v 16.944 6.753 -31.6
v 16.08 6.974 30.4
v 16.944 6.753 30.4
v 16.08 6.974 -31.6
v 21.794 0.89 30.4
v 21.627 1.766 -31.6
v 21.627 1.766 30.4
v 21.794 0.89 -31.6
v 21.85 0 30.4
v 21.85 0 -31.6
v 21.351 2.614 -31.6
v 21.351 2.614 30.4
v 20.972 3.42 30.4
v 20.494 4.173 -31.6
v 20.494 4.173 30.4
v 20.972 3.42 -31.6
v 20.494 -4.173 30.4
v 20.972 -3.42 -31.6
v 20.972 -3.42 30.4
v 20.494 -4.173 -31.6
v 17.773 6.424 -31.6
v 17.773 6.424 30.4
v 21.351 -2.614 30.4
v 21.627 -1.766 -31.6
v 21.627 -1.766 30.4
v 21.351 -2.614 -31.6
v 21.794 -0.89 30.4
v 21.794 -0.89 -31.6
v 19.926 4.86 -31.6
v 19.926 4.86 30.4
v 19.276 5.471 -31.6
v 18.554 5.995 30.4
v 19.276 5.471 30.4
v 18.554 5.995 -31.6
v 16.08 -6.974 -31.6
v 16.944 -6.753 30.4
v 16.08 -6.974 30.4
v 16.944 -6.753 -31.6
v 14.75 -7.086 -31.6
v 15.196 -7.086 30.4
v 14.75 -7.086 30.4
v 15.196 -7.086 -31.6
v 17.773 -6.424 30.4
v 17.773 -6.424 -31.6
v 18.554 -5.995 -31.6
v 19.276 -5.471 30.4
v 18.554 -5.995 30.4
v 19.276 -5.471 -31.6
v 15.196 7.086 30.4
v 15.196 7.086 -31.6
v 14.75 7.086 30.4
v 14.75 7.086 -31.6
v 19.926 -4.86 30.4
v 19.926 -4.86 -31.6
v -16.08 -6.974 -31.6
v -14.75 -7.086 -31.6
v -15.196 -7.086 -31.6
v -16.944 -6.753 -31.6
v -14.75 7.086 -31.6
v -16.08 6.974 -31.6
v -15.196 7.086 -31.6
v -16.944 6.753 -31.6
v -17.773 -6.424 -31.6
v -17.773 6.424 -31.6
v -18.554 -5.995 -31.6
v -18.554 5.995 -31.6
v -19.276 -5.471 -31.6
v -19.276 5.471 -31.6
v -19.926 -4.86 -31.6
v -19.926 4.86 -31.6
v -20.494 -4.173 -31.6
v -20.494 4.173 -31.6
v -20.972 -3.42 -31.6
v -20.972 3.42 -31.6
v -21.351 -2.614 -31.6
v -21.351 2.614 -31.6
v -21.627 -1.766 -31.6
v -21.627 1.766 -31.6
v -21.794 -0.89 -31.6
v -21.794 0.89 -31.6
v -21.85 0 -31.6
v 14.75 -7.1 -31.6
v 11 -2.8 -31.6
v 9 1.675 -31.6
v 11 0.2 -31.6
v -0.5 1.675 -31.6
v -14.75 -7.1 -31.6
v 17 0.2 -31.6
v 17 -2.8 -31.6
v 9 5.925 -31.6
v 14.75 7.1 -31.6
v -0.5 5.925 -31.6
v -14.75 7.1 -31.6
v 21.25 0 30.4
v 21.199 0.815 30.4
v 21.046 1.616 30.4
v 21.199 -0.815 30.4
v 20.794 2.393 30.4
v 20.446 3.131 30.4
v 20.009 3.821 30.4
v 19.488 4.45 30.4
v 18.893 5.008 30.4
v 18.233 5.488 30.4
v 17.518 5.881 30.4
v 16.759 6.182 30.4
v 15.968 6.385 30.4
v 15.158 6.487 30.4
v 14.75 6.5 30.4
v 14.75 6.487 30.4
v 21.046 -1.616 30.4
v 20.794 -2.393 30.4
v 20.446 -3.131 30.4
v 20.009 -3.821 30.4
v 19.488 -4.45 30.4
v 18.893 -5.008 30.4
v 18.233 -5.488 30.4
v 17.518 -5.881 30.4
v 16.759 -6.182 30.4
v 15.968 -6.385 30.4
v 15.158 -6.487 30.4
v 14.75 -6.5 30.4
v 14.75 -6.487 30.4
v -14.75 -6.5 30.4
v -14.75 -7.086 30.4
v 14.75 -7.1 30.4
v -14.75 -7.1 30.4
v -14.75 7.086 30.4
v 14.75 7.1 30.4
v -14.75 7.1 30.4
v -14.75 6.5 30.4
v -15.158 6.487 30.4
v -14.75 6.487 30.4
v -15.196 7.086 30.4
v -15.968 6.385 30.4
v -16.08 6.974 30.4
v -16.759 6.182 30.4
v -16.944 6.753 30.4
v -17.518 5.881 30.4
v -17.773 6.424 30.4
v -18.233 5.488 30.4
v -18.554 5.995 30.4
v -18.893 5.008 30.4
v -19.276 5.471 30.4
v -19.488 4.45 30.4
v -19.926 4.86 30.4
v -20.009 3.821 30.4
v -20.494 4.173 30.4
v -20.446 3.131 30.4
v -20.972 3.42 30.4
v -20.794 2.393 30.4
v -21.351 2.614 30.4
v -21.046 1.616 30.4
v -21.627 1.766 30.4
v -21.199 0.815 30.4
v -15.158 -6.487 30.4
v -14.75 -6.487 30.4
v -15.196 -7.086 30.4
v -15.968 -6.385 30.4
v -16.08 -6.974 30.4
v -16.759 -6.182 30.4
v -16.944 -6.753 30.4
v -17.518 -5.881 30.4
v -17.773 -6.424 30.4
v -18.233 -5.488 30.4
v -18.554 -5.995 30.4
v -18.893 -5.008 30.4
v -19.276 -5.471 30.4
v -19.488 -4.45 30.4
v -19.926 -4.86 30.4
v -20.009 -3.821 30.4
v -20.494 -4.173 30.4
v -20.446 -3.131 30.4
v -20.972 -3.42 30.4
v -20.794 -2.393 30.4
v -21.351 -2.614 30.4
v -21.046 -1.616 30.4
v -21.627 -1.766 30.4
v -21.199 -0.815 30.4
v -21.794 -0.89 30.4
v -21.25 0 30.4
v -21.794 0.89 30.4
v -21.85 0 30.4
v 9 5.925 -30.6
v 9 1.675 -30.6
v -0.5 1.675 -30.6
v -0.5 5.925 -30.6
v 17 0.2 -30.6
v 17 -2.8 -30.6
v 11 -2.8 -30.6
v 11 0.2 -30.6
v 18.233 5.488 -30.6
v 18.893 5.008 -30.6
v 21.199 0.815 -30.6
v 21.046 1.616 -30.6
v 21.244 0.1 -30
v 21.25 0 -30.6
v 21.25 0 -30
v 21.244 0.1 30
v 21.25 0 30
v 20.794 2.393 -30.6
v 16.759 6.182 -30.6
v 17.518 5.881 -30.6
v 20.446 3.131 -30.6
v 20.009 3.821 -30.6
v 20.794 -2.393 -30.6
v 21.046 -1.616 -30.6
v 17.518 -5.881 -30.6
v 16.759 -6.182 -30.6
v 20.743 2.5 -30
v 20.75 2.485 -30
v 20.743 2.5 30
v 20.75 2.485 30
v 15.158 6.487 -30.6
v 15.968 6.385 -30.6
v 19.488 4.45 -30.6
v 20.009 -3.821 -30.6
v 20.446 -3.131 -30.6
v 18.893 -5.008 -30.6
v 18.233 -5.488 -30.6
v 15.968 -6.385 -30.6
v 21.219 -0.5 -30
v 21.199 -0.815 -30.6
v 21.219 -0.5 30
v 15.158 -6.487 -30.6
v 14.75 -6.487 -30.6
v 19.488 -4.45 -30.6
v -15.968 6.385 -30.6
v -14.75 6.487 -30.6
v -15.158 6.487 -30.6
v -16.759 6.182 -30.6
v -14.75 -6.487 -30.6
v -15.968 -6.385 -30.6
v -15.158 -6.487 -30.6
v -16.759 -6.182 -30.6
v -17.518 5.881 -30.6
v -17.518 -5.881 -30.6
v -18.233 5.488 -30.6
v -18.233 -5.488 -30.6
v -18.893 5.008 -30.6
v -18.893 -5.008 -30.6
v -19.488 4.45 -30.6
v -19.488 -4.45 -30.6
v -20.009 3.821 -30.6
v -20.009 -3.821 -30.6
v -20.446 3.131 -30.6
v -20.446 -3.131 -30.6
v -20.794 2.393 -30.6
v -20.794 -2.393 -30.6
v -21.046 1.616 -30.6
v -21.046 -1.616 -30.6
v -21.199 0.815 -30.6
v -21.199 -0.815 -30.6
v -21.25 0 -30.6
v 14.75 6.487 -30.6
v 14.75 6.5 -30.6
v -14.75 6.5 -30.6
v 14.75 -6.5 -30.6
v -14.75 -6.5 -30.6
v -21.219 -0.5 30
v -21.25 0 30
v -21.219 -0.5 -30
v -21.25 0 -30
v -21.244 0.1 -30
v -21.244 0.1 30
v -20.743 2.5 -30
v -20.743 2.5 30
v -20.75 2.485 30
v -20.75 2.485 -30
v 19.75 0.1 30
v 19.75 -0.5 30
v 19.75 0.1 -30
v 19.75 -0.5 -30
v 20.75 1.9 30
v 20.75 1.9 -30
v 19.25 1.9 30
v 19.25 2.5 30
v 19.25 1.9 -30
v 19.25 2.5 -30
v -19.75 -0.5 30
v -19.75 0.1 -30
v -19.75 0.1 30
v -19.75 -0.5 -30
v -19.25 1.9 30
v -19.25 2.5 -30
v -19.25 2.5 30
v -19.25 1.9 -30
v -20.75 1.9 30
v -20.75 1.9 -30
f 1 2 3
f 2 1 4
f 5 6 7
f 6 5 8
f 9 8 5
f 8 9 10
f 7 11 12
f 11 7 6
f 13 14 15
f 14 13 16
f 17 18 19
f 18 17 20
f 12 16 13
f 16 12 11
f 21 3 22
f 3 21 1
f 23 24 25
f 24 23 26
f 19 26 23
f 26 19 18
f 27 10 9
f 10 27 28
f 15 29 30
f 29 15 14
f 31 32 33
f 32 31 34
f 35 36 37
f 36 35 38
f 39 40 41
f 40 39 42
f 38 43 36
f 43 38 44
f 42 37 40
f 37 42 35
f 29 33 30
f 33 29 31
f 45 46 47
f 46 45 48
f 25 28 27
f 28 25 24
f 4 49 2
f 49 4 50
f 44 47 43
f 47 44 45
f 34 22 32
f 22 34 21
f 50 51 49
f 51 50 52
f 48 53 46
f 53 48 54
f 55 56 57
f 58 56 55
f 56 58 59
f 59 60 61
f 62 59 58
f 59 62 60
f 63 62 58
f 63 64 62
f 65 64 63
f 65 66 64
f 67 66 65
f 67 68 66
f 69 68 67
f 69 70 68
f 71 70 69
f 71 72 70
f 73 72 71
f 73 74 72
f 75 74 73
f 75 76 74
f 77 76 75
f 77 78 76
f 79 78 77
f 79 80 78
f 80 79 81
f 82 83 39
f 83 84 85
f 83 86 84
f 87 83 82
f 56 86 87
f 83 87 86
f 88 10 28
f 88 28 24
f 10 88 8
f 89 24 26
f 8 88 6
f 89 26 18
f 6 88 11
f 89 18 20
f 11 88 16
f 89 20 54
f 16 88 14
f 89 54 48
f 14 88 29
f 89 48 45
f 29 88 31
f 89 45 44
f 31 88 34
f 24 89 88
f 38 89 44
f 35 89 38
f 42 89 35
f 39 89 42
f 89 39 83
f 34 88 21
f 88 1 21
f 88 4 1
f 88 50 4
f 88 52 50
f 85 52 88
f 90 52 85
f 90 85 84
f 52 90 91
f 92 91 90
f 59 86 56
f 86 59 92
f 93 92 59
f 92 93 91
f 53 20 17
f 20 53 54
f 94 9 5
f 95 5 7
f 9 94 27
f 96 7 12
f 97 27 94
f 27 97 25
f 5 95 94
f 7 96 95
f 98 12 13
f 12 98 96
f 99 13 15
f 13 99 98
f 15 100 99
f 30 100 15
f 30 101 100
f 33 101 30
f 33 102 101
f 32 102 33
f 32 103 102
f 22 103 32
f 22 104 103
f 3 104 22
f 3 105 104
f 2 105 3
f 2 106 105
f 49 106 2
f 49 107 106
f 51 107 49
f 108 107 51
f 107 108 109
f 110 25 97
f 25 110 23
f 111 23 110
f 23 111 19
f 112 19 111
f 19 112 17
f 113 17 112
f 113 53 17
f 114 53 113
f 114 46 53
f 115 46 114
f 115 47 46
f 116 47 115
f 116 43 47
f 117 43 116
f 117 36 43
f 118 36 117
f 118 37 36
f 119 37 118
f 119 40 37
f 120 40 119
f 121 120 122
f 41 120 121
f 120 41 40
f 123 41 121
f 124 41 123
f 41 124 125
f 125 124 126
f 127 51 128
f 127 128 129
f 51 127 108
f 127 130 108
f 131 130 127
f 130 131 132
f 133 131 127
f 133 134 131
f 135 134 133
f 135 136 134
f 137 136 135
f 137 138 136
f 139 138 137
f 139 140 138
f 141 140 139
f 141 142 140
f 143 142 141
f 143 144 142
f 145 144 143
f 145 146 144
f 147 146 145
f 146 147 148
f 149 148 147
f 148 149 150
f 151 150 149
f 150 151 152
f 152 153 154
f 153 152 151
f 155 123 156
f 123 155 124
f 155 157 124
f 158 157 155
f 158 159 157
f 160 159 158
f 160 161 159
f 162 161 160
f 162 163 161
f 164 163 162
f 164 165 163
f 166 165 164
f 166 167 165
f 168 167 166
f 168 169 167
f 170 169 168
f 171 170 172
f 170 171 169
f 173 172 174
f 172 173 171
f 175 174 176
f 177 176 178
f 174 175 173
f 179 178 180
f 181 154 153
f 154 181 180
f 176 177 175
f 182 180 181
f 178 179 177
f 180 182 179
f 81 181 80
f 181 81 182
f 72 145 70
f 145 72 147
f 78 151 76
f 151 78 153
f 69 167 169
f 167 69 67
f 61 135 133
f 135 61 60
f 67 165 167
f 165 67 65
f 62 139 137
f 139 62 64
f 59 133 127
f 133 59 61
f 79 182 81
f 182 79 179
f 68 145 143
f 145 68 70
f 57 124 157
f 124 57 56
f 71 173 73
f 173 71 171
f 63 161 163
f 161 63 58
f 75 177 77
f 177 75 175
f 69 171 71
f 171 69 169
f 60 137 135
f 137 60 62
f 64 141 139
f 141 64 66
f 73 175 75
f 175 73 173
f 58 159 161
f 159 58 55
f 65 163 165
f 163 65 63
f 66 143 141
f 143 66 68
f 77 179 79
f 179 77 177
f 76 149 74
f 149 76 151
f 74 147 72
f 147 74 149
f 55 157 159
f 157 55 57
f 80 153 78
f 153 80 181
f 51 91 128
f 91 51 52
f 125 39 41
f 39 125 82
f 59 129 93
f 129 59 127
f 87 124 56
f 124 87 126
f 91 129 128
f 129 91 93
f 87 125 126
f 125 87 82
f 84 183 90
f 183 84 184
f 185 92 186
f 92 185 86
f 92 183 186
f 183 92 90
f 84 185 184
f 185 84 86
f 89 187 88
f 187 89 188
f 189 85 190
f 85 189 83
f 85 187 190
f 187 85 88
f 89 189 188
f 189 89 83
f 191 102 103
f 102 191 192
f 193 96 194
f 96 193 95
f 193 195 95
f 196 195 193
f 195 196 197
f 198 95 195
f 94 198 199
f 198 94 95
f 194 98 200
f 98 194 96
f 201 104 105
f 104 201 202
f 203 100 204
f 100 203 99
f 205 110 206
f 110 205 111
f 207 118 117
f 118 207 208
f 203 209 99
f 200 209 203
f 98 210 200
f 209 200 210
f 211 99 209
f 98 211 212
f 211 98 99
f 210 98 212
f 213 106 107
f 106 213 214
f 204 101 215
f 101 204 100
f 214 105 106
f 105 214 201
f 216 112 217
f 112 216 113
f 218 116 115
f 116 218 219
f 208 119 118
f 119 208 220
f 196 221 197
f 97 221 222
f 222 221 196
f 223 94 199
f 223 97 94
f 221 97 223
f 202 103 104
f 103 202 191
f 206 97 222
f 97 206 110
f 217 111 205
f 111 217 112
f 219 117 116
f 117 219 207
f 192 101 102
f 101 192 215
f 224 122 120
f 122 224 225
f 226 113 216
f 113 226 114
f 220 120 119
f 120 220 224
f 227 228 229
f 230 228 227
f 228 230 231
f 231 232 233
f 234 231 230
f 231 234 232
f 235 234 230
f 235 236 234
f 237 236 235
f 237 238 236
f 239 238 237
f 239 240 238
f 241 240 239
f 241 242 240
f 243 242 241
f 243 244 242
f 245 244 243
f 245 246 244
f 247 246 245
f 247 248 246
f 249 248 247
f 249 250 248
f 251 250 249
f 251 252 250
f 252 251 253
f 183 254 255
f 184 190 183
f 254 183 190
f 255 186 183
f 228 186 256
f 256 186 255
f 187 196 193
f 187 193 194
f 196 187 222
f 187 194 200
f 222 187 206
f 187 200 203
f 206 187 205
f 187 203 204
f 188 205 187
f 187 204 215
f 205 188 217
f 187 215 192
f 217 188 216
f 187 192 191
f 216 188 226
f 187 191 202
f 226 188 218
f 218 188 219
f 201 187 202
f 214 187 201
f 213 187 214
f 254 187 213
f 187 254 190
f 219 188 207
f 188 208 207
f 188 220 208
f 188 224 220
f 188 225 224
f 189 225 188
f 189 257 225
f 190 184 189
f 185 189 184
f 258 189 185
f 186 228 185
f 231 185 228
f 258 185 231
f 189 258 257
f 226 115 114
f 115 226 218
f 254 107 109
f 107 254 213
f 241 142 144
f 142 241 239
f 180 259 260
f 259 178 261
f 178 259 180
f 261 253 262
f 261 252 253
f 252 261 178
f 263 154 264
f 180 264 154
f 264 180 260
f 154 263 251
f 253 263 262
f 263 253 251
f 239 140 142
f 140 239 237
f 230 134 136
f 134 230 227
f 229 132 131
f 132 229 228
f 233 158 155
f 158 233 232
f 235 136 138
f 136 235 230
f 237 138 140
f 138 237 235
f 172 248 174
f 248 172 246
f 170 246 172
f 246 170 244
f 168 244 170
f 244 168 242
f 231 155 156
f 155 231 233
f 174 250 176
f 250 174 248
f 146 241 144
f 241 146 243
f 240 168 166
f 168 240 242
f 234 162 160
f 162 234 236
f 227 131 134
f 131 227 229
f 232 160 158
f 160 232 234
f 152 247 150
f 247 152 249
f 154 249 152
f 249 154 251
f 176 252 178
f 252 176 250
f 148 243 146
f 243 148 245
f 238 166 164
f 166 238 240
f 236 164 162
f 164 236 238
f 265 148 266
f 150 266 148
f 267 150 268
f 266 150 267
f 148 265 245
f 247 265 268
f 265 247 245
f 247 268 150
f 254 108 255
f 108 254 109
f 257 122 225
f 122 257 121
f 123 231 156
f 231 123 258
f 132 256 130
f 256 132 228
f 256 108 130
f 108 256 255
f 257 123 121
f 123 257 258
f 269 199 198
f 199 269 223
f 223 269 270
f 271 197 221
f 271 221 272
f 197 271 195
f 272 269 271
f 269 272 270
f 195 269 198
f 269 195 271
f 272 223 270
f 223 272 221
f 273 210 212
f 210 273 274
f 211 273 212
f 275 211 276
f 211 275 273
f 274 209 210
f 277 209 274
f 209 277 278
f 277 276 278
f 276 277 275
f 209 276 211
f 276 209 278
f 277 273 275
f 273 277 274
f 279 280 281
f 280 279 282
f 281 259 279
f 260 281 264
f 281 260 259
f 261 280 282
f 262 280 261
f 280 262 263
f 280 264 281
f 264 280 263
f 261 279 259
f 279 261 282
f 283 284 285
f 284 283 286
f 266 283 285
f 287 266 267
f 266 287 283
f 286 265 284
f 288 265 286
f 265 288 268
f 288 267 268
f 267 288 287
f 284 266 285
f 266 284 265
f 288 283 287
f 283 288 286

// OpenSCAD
// Simple Box for Espruino
// Open at one end so Espruino slides in
// Can be 3D printed on end

$fn = 50;
INNER_RAD = 6.5;
INNER_LENGTH = 60;
INNER_WIDTH = 42.5;
THICKNESS = 0.6;
END_THICKNESS = 1;
OUTER_RAD = INNER_RAD + THICKNESS;
OUTER_LENGTH = INNER_LENGTH + END_THICKNESS*2;
OUTER_WIDTH = INNER_WIDTH + THICKNESS*2;
GRIP_SIZE = 1.5;
GRIP_OFFSET = 1;

module shape(w,r,l) {
 union() {
  translate([(w/2)-r,0,0]) cylinder(r=r,h=l,center=true);
  translate([r-(w/2),0,0]) cylinder(r=r,h=l,center=true);
  cube([w-r*2,r*2,l], center=true);
 }
}

module board_grip(w,tweak) {
 spacing = THICKNESS + 1.2;
 l = INNER_LENGTH;
 h = THICKNESS; 
 translate([0,-(spacing/2+h/2),0]) cube([w,h,l], center=true);
 translate([tweak,h/2+spacing/2,0]) cube([w,h,l], center=true);
}

module back_cutouts() {
 d = END_THICKNESS+0.2;
 o = -(END_THICKNESS + 0.1);
 translate([4.25,0.8+2,o]) cube([9.5,4.25,d], center=true); // USB
 translate([41/2 - 6.5,-(0.8+1.5),o]) cube([6,3,d], center=true); // Power
}

module side_cutouts() {
 r=2;
 h=THICKNESS+4;
 // ------------------------------------ UNCOMMENT THE NEXT 2 LINES FOR BUTTON HOLES
 // translate([13,0,26.5]) rotate(a=[90,0,0]) cylinder(r=r,h=h,center=true);
 // translate([13,0,38.5]) rotate(a=[90,0,0]) cylinder(r=r,h=h,center=true);
 // ------------------------------------
}

union() {
 difference() {
  translate([0,0,-THICKNESS]) shape(OUTER_WIDTH, OUTER_RAD, OUTER_LENGTH);
  union() {
   translate([0,GRIP_OFFSET,-INNER_LENGTH/2]) back_cutouts();
   shape(INNER_WIDTH, INNER_RAD, INNER_LENGTH+THICKNESS*2);
   translate([0,-(INNER_RAD+OUTER_RAD)/2,-INNER_LENGTH/2]) side_cutouts();
  }
 }
 translate([(INNER_WIDTH-GRIP_SIZE)/2,GRIP_OFFSET,0]) board_grip(GRIP_SIZE,-0.5);
 translate([(GRIP_SIZE-INNER_WIDTH)/2,GRIP_OFFSET,0]) board_grip(GRIP_SIZE,0.5);
}
